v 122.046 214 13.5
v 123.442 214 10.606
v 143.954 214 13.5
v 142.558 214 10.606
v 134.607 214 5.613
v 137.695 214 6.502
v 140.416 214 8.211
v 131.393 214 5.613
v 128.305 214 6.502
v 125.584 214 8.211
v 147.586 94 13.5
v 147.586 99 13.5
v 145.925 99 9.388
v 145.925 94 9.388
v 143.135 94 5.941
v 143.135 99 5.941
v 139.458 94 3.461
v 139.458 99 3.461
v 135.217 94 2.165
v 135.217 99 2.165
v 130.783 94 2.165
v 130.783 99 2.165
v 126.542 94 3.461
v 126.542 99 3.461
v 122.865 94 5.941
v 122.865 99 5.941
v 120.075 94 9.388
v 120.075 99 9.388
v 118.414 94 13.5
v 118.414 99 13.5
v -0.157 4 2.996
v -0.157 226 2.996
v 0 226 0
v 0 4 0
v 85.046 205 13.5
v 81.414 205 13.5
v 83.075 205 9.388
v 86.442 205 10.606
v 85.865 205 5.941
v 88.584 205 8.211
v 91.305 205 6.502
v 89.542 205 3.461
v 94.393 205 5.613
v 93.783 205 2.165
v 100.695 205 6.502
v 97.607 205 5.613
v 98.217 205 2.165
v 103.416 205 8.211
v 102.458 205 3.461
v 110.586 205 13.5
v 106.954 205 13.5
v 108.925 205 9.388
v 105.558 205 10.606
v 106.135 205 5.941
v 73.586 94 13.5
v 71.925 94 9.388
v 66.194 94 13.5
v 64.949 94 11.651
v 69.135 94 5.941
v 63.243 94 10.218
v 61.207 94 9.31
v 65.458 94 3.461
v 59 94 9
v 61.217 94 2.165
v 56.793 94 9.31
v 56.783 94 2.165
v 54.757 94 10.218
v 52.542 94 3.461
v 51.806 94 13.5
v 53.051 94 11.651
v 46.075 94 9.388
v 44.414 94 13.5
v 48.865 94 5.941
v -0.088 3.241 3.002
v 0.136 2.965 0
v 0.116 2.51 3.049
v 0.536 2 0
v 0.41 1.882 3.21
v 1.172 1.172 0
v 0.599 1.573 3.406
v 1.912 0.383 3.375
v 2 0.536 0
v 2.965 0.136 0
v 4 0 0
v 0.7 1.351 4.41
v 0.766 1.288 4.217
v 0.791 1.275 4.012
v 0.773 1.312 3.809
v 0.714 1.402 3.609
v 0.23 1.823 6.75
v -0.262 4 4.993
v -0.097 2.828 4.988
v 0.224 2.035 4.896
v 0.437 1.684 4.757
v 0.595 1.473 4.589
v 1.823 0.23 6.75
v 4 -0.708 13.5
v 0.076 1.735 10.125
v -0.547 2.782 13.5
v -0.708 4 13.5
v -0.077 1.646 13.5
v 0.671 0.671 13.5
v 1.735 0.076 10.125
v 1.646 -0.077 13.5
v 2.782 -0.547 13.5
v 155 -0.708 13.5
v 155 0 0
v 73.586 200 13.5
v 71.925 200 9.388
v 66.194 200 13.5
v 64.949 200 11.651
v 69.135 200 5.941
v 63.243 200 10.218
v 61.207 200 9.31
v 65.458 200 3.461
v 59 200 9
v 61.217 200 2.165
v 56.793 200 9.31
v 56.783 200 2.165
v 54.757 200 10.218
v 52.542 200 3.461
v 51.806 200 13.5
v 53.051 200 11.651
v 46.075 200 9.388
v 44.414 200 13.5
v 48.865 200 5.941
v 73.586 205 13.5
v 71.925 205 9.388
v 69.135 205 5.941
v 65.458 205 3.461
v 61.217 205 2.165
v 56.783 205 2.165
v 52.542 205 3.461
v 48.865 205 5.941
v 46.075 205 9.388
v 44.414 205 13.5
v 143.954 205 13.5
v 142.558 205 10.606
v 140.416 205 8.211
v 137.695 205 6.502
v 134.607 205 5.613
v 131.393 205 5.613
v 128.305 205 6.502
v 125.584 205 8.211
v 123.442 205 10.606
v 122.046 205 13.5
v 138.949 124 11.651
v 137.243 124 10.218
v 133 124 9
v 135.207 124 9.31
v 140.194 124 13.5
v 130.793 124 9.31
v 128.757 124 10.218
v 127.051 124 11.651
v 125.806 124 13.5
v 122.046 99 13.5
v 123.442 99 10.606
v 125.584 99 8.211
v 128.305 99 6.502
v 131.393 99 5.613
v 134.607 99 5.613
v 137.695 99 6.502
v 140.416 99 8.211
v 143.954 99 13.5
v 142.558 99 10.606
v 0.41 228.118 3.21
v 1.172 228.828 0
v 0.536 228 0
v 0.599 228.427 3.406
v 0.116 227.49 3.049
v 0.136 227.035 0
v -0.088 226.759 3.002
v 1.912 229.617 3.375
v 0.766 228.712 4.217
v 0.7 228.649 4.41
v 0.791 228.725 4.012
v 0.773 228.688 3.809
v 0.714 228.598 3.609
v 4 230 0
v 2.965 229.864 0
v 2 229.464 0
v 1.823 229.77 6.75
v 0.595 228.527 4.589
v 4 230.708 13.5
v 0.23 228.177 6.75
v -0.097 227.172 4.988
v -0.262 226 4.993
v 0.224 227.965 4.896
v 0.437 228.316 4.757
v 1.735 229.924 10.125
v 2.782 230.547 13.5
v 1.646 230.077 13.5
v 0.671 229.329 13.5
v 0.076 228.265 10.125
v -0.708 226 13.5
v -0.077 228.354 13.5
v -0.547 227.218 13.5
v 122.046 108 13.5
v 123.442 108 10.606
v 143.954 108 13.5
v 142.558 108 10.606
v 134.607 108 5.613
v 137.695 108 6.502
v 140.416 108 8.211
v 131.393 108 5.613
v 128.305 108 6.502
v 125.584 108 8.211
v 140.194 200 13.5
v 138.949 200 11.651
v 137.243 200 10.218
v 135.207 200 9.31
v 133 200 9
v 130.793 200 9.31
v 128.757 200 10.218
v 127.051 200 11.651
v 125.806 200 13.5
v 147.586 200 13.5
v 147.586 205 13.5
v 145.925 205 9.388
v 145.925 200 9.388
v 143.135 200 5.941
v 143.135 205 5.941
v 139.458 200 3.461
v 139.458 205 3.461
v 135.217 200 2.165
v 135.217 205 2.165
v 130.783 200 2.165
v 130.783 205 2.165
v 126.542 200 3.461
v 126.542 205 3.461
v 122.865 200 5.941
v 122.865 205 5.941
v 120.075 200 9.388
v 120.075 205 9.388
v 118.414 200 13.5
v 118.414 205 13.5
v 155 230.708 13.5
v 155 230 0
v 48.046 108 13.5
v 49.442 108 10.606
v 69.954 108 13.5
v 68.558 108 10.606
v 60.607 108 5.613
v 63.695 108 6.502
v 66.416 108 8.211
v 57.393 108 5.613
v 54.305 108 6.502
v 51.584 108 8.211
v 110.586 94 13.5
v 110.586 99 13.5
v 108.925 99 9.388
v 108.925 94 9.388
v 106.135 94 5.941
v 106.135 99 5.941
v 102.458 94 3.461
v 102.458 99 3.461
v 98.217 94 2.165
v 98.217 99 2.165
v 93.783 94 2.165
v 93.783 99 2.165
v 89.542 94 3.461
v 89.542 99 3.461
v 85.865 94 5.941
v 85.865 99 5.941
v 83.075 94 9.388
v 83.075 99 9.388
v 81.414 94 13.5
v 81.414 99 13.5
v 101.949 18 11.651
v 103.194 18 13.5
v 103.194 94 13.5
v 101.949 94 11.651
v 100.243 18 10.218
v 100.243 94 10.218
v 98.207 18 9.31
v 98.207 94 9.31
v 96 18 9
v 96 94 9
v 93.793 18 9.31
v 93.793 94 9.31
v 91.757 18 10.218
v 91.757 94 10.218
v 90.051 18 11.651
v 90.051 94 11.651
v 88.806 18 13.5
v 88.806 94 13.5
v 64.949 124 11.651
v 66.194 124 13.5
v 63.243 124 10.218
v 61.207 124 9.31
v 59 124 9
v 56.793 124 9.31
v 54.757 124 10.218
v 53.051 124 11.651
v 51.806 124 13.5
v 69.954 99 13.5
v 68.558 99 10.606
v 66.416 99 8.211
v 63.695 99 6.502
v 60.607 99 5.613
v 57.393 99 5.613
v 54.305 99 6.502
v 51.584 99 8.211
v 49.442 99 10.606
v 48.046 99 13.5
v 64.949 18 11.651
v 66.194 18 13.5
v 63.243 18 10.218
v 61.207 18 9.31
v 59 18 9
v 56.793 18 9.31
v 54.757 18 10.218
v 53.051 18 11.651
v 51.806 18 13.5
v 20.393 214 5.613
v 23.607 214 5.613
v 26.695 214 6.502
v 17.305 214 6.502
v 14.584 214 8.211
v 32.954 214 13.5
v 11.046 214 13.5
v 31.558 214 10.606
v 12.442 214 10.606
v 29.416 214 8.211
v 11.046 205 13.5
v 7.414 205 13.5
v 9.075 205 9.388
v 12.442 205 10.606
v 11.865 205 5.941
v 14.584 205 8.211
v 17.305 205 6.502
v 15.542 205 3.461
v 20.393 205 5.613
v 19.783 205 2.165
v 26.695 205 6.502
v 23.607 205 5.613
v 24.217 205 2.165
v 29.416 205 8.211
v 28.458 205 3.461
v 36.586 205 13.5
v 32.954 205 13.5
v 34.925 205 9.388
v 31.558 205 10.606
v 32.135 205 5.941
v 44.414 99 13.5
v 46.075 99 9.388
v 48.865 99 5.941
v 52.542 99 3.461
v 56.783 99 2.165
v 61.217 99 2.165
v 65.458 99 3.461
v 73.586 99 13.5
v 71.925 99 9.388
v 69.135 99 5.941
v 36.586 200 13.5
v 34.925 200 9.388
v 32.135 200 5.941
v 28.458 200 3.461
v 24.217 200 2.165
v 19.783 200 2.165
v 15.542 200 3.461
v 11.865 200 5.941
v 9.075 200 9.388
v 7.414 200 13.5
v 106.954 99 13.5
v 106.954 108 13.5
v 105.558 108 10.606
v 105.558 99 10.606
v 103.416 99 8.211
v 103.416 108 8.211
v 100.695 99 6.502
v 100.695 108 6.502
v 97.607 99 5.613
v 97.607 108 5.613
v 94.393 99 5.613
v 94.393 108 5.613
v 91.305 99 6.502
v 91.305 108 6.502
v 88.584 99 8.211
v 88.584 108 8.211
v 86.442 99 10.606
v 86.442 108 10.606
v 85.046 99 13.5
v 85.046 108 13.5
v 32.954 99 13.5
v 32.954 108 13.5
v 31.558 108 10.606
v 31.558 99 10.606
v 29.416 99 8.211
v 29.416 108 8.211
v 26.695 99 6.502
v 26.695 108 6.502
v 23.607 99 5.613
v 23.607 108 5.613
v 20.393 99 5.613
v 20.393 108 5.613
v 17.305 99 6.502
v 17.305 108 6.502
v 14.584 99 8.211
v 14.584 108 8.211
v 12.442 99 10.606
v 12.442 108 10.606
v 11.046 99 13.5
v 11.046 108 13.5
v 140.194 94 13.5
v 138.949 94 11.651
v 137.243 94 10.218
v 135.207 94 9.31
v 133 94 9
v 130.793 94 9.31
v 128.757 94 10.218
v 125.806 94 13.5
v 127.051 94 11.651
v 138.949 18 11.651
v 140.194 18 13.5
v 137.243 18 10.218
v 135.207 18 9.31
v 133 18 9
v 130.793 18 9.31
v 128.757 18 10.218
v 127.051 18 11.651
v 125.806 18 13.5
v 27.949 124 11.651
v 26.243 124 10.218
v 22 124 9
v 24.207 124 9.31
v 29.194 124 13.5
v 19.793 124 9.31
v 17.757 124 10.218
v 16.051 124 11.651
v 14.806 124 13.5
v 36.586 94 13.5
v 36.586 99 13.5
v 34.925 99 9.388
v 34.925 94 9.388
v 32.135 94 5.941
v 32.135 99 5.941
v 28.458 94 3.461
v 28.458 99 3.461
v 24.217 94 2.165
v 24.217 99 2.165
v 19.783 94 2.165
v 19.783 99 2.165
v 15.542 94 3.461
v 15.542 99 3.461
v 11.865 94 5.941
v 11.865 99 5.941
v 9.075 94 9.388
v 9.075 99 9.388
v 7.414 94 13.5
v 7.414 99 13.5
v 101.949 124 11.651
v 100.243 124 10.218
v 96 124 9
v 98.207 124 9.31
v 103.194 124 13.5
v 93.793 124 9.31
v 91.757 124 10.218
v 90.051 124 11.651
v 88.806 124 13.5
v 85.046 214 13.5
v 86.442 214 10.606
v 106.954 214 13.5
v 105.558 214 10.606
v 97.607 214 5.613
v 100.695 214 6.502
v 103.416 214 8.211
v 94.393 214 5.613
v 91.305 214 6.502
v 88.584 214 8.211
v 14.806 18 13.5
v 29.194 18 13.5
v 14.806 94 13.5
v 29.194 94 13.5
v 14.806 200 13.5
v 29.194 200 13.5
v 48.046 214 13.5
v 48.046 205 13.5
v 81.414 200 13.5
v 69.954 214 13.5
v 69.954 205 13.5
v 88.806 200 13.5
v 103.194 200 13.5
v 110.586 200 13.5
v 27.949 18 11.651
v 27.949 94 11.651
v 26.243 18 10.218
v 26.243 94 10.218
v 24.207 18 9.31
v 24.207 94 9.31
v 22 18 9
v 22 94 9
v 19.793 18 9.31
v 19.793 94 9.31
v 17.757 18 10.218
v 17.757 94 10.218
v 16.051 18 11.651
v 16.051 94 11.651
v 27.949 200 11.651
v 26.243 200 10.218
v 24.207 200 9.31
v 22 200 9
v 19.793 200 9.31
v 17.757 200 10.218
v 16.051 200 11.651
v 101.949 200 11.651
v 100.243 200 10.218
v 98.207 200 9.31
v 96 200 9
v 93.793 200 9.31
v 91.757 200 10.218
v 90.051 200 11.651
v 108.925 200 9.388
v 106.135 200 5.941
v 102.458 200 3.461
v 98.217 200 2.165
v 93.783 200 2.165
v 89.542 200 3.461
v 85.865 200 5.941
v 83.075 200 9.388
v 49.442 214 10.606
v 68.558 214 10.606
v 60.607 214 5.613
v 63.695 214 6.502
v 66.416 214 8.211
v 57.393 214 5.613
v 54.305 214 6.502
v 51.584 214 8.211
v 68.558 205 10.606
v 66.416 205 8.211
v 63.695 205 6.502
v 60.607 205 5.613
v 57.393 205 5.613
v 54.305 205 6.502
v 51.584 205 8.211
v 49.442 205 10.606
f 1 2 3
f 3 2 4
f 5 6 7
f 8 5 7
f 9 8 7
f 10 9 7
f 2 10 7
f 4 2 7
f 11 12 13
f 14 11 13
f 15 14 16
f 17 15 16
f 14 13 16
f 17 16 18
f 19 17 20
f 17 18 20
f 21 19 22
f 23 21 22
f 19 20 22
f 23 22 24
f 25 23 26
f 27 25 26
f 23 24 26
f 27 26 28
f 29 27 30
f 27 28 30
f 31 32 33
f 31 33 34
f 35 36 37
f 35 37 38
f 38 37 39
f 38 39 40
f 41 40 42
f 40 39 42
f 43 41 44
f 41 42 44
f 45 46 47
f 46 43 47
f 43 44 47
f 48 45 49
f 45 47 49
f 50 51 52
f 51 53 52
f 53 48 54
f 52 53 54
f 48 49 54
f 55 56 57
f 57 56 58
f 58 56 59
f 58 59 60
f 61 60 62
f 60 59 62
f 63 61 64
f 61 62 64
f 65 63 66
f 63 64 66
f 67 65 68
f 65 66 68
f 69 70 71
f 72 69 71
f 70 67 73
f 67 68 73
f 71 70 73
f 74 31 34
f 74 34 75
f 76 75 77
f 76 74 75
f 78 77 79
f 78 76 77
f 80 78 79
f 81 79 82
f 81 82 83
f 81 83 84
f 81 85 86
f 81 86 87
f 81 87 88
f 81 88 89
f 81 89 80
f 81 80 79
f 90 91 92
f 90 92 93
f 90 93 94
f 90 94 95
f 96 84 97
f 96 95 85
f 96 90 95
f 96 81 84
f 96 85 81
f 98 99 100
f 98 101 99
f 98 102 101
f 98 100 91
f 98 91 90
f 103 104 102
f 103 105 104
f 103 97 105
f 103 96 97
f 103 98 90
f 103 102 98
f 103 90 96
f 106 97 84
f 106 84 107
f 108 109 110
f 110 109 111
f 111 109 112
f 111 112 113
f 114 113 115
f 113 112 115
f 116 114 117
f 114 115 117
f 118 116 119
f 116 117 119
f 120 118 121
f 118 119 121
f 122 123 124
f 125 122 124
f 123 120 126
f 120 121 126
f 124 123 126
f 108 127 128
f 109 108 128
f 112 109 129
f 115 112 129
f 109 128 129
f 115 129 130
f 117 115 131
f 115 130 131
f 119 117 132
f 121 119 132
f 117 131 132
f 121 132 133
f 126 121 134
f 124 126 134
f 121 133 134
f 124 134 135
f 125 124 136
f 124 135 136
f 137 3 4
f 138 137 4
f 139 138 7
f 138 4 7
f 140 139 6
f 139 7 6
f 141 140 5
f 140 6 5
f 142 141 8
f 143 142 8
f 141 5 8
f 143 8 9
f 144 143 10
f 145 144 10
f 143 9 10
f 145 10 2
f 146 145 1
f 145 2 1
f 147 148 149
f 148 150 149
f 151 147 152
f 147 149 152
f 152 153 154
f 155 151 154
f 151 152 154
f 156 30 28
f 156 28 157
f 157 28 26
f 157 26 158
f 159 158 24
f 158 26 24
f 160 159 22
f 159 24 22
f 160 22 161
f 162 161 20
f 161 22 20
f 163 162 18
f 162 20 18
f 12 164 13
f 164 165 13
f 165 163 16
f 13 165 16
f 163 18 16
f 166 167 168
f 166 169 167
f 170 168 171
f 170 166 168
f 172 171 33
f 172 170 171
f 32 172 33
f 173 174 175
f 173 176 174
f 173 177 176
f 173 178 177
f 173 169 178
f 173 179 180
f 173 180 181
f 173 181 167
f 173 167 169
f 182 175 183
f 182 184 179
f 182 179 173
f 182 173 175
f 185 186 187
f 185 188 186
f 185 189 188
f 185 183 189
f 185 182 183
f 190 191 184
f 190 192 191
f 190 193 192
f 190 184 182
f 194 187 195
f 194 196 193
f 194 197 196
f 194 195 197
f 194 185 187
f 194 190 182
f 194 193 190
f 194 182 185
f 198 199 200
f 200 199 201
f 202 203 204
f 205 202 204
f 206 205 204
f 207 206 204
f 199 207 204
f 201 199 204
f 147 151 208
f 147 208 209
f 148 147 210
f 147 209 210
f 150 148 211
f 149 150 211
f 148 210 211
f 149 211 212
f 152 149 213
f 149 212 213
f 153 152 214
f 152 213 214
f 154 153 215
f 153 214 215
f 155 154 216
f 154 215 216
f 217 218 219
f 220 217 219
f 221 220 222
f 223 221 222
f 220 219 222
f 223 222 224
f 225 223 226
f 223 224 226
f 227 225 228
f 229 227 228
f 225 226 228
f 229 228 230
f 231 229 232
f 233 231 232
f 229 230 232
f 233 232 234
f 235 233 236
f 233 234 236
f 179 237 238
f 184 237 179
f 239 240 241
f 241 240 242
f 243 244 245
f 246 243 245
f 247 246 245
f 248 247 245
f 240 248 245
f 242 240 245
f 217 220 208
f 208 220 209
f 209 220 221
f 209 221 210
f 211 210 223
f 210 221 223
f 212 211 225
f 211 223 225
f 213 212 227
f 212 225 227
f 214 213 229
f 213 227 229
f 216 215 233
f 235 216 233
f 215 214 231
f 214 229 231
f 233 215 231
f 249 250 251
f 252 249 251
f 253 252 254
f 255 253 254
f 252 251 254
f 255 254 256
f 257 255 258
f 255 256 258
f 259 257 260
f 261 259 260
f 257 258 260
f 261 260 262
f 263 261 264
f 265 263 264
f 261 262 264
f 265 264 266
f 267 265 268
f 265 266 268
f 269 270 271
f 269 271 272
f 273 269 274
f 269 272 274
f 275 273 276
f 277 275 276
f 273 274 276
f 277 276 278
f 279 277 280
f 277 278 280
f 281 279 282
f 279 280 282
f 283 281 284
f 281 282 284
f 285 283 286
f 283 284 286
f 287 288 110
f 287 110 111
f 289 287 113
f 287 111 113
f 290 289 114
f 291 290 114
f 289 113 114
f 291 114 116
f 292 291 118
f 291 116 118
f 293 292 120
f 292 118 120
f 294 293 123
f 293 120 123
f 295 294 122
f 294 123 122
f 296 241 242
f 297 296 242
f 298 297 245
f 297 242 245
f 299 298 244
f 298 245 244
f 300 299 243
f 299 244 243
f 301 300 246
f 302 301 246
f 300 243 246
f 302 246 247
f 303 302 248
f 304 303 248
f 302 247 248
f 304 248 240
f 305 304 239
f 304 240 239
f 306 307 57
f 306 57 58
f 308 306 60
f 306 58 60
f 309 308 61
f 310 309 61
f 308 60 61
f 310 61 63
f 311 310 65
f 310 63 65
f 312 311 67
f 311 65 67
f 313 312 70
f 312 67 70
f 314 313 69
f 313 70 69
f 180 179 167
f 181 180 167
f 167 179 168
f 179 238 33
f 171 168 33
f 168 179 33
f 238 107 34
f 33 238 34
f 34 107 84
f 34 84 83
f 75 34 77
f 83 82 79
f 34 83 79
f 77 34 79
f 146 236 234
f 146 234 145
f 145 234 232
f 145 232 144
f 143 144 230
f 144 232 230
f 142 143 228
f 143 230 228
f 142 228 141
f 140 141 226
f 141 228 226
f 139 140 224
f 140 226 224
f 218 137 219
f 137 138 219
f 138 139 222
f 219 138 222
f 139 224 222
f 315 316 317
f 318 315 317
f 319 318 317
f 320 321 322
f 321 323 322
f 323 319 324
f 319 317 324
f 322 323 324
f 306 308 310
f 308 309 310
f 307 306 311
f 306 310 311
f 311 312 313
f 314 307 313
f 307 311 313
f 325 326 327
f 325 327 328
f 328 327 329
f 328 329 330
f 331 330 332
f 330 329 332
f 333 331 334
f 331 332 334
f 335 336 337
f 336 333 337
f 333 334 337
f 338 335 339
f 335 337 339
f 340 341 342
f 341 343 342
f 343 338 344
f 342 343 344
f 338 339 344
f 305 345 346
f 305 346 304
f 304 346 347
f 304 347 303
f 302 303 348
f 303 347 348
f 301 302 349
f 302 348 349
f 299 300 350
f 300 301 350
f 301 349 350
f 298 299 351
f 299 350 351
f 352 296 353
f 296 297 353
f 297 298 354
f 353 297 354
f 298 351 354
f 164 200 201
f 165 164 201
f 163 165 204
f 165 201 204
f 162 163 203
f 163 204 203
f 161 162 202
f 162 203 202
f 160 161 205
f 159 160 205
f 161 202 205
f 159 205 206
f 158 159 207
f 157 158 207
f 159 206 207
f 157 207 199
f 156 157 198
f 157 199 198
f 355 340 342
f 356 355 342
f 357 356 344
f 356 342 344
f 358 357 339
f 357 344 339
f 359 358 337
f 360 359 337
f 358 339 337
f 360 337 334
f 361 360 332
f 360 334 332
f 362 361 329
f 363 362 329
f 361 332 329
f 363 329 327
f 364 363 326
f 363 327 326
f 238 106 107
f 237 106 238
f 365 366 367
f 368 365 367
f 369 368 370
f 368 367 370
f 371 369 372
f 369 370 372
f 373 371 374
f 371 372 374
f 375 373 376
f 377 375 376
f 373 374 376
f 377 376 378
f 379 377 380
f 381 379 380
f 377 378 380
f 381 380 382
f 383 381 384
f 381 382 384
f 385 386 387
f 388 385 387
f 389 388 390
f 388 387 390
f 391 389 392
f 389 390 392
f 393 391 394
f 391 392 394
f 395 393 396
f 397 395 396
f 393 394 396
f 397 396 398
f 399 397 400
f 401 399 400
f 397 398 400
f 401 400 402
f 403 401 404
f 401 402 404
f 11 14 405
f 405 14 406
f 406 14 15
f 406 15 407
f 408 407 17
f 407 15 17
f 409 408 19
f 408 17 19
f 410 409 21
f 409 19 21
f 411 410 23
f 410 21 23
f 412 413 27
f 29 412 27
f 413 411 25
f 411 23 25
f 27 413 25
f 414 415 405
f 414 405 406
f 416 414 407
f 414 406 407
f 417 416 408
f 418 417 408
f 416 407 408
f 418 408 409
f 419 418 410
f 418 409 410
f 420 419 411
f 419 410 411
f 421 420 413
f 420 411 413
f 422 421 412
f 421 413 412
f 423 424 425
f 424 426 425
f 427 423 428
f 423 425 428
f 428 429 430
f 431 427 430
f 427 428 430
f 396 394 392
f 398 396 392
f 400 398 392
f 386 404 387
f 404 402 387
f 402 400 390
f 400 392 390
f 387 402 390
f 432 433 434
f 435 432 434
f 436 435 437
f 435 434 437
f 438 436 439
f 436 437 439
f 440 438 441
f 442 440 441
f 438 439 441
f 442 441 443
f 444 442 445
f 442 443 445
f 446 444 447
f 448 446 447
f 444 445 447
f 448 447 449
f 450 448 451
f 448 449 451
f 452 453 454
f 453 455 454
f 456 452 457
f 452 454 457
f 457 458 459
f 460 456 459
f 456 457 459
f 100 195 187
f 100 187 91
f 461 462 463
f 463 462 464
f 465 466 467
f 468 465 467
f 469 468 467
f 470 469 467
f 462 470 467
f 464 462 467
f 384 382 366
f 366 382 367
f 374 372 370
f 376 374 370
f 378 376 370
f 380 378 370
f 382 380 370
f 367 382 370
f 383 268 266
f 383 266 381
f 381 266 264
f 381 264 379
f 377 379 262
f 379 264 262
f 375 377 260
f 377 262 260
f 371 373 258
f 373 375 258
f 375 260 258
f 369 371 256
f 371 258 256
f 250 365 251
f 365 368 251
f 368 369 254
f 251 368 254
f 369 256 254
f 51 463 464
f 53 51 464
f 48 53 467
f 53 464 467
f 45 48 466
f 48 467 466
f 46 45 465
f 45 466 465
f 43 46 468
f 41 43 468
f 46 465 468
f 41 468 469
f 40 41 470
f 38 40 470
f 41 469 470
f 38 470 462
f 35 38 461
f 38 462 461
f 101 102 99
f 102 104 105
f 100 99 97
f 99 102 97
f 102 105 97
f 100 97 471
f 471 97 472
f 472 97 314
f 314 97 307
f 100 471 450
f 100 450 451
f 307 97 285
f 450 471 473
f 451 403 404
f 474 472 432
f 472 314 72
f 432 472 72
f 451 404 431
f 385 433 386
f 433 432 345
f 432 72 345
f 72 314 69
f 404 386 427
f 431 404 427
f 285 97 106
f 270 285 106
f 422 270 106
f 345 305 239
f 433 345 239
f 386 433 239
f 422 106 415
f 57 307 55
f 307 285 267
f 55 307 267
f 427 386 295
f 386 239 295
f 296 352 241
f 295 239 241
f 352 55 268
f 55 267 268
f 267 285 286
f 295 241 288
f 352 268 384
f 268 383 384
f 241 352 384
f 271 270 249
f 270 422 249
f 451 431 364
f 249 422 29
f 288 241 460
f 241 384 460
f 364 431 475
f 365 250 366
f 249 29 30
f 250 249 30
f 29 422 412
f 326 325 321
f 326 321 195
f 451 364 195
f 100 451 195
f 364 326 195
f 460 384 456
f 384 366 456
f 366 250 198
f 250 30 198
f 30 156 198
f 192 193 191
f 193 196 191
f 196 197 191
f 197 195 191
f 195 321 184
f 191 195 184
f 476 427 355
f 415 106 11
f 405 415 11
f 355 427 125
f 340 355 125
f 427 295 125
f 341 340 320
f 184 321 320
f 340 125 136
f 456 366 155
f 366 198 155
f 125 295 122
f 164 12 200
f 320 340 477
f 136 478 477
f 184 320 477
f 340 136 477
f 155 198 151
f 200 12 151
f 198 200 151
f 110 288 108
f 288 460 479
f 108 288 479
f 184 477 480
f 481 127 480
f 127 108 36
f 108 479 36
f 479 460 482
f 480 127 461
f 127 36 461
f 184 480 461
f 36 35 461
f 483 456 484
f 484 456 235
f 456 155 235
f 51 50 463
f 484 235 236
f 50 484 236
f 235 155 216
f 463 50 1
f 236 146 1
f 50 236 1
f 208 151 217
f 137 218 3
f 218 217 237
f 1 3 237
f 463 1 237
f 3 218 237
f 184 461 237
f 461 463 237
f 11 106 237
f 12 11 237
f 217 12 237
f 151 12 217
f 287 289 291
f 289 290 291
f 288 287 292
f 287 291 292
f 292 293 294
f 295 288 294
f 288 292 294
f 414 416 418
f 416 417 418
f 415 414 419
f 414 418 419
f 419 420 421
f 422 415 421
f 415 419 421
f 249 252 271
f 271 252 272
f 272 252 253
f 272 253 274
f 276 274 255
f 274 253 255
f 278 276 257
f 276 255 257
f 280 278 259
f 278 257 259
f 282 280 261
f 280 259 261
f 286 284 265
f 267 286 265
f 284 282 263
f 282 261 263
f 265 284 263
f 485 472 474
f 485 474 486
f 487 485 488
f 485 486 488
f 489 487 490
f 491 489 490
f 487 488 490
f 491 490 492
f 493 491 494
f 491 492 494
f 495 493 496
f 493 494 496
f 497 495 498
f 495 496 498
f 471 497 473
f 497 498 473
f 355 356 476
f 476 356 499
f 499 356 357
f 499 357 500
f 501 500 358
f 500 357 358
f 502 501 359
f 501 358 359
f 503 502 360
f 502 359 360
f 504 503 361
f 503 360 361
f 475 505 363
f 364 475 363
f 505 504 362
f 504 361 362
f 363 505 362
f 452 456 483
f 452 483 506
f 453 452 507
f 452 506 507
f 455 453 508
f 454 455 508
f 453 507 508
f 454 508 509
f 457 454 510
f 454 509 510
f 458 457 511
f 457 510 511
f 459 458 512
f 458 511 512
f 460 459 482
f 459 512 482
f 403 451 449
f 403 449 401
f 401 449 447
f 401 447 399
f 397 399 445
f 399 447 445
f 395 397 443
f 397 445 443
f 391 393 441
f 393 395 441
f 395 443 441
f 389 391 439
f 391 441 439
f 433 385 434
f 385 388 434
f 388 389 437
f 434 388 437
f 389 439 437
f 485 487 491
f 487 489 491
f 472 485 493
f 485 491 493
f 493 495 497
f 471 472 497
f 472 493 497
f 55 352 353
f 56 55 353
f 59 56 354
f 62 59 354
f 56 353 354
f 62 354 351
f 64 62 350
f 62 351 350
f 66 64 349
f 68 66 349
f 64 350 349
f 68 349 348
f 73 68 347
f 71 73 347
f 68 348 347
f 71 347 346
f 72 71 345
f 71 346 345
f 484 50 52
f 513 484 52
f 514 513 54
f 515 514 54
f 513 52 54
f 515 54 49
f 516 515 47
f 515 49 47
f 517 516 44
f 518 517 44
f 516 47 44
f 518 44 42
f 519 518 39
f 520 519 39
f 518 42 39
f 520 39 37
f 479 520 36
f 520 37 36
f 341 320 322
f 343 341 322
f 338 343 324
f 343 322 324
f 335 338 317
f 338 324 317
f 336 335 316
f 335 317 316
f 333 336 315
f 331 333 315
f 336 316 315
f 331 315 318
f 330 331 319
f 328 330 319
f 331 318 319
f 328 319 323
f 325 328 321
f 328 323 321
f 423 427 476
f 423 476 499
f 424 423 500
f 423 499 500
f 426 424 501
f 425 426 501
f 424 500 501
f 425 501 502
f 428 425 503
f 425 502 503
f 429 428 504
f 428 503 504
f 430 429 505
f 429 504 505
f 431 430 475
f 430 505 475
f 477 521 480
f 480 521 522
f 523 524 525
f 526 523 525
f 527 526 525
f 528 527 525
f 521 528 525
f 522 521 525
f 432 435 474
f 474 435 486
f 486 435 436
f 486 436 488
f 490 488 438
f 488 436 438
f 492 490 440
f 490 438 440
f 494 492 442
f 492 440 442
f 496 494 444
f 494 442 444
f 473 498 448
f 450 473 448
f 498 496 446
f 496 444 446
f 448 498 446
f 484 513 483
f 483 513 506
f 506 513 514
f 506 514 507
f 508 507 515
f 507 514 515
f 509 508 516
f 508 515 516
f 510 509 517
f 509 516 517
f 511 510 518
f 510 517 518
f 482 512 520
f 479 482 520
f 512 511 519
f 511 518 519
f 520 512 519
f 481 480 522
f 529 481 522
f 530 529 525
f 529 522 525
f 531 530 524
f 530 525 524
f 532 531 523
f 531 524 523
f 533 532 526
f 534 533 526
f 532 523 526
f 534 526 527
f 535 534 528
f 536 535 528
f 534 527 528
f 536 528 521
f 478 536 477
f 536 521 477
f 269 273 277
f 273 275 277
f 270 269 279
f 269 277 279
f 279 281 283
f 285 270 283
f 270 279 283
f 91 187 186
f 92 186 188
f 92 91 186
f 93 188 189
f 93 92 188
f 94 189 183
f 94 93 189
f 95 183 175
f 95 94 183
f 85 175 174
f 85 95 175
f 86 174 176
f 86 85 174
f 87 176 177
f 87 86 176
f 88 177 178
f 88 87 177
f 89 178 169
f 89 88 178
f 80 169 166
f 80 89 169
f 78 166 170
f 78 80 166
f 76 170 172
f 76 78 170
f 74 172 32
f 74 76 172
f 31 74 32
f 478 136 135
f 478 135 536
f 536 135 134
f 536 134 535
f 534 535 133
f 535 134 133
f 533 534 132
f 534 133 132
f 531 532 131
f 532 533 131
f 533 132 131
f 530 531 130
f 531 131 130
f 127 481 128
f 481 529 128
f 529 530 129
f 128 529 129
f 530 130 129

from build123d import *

# Parameters (mm, degrees)
F1_DEPTH  = 17
F1_TAPER  = -3
F4_DEPTH  = 25
F16_W     = 246.069
F16_H     = 9.169
F17_DEPTH = 155.8919323478


with BuildPart() as f1:
    # F0 (on Top) → F1 (new body)
    with BuildSketch(Plane.XY):
        with BuildLine():
            ThreePointArc((0, 4), (1.1715728753, 1.1715728753), (4, 0))
            Line((4, 0), (155, 0))
            Line((155, 0), (155, 230))
            Line((155, 230), (4, 230))
            ThreePointArc((4, 230), (1.1715728753, 228.8284271247), (0, 226))
            Line((0, 226), (0, 4))
        make_face()
    extrude(amount=F1_DEPTH, taper=F1_TAPER)

    # F3 (on offset) → F4 (cut)
    with BuildSketch(Plane.YZ.offset(155)):
        Polygon((-0.8909322478, 17), (0, 0), (230, 0), (230.8909322478, 17), align=None)
    extrude(amount=F4_DEPTH, mode=Mode.SUBTRACT)

    # F5 (on face) → F6 (revolve, cut)
    with BuildSketch(Plane.XY.offset(17)):
        Polygon((22, 94), (22, 18), (30, 18), (30, 94), (37, 94), (37, 99), (33.5, 99), (33.5, 108), (22, 108), (22, 99), align=None)
    revolve(axis=Axis((22, 56, 17), (0, 1, 0)), mode=Mode.SUBTRACT)

    # F5 (on face) → F7 (revolve, cut)
    with BuildSketch(Plane.XY.offset(17)):
        Polygon((59, 94), (59, 18), (67, 18), (67, 94), (74, 94), (74, 99), (70.5, 99), (70.5, 108), (59, 108), (59, 99), align=None)
    revolve(axis=Axis((59, 56, 17), (0, 1, 0)), mode=Mode.SUBTRACT)

    # F5 (on face) → F8 (revolve, cut)
    with BuildSketch(Plane.XY.offset(17)):
        Polygon((96, 94), (96, 18), (104, 18), (104, 94), (111, 94), (111, 99), (107.5, 99), (107.5, 108), (96, 108), (96, 99), align=None)
    revolve(axis=Axis((96, 56, 17), (0, 1, 0)), mode=Mode.SUBTRACT)

    # F5 (on face) → F9 (revolve, cut)
    with BuildSketch(Plane.XY.offset(17)):
        Polygon((133, 94), (133, 18), (141, 18), (141, 94), (148, 94), (148, 99), (144.5, 99), (144.5, 108), (133, 108), (133, 99), align=None)
    revolve(axis=Axis((133, 56, 17), (0, 1, 0)), mode=Mode.SUBTRACT)

    # F5 (on face) → F10 (revolve, cut)
    with BuildSketch(Plane.XY.offset(17)):
        Polygon((22, 200), (22, 124), (30, 124), (30, 200), (37, 200), (37, 205), (33.5, 205), (33.5, 214), (22, 214), (22, 205), align=None)
    revolve(axis=Axis((22, 162, 17), (0, 1, 0)), mode=Mode.SUBTRACT)

    # F5 (on face) → F11 (revolve, cut)
    with BuildSketch(Plane.XY.offset(17)):
        Polygon((59, 200), (59, 124), (67, 124), (67, 200), (74, 200), (74, 205), (70.5, 205), (70.5, 214), (59, 214), (59, 205), align=None)
    revolve(axis=Axis((59, 162, 17), (0, 1, 0)), mode=Mode.SUBTRACT)

    # F5 (on face) → F12 (revolve, cut)
    with BuildSketch(Plane.XY.offset(17)):
        Polygon((96, 200), (96, 124), (104, 124), (104, 200), (111, 200), (111, 205), (107.5, 205), (107.5, 214), (96, 214), (96, 205), align=None)
    revolve(axis=Axis((96, 162, 17), (0, 1, 0)), mode=Mode.SUBTRACT)

    # F5 (on face) → F13 (revolve, cut)
    with BuildSketch(Plane.XY.offset(17)):
        Polygon((133, 200), (133, 124), (141, 124), (141, 200), (148, 200), (148, 205), (144.5, 205), (144.5, 214), (133, 214), (133, 205), align=None)
    revolve(axis=Axis((133, 162, 17), (0, 1, 0)), mode=Mode.SUBTRACT)

    # F14 (on face) → F15 (revolve, cut)
    with BuildSketch(Plane(origin=(0, 0, 0), x_dir=(0, -1, 0), z_dir=(-0.9986295348, 0, -0.0523359562))):
        Polygon((2, 4), (-226, 4), (-231, 4), (-231, 3), (2, 3), align=None)
    revolve(axis=Axis((-0.209343825, 112, 3.994518139), (0, 1, 0)), mode=Mode.SUBTRACT)

    # F16 (on face) → F17 (cut, through all)
    with BuildSketch(Plane.YZ.offset(155)):
        with Locations((113.0345, 18.0845)):
            Rectangle(F16_W, F16_H)
    extrude(amount=-F17_DEPTH, mode=Mode.SUBTRACT)


solid = f1.part
